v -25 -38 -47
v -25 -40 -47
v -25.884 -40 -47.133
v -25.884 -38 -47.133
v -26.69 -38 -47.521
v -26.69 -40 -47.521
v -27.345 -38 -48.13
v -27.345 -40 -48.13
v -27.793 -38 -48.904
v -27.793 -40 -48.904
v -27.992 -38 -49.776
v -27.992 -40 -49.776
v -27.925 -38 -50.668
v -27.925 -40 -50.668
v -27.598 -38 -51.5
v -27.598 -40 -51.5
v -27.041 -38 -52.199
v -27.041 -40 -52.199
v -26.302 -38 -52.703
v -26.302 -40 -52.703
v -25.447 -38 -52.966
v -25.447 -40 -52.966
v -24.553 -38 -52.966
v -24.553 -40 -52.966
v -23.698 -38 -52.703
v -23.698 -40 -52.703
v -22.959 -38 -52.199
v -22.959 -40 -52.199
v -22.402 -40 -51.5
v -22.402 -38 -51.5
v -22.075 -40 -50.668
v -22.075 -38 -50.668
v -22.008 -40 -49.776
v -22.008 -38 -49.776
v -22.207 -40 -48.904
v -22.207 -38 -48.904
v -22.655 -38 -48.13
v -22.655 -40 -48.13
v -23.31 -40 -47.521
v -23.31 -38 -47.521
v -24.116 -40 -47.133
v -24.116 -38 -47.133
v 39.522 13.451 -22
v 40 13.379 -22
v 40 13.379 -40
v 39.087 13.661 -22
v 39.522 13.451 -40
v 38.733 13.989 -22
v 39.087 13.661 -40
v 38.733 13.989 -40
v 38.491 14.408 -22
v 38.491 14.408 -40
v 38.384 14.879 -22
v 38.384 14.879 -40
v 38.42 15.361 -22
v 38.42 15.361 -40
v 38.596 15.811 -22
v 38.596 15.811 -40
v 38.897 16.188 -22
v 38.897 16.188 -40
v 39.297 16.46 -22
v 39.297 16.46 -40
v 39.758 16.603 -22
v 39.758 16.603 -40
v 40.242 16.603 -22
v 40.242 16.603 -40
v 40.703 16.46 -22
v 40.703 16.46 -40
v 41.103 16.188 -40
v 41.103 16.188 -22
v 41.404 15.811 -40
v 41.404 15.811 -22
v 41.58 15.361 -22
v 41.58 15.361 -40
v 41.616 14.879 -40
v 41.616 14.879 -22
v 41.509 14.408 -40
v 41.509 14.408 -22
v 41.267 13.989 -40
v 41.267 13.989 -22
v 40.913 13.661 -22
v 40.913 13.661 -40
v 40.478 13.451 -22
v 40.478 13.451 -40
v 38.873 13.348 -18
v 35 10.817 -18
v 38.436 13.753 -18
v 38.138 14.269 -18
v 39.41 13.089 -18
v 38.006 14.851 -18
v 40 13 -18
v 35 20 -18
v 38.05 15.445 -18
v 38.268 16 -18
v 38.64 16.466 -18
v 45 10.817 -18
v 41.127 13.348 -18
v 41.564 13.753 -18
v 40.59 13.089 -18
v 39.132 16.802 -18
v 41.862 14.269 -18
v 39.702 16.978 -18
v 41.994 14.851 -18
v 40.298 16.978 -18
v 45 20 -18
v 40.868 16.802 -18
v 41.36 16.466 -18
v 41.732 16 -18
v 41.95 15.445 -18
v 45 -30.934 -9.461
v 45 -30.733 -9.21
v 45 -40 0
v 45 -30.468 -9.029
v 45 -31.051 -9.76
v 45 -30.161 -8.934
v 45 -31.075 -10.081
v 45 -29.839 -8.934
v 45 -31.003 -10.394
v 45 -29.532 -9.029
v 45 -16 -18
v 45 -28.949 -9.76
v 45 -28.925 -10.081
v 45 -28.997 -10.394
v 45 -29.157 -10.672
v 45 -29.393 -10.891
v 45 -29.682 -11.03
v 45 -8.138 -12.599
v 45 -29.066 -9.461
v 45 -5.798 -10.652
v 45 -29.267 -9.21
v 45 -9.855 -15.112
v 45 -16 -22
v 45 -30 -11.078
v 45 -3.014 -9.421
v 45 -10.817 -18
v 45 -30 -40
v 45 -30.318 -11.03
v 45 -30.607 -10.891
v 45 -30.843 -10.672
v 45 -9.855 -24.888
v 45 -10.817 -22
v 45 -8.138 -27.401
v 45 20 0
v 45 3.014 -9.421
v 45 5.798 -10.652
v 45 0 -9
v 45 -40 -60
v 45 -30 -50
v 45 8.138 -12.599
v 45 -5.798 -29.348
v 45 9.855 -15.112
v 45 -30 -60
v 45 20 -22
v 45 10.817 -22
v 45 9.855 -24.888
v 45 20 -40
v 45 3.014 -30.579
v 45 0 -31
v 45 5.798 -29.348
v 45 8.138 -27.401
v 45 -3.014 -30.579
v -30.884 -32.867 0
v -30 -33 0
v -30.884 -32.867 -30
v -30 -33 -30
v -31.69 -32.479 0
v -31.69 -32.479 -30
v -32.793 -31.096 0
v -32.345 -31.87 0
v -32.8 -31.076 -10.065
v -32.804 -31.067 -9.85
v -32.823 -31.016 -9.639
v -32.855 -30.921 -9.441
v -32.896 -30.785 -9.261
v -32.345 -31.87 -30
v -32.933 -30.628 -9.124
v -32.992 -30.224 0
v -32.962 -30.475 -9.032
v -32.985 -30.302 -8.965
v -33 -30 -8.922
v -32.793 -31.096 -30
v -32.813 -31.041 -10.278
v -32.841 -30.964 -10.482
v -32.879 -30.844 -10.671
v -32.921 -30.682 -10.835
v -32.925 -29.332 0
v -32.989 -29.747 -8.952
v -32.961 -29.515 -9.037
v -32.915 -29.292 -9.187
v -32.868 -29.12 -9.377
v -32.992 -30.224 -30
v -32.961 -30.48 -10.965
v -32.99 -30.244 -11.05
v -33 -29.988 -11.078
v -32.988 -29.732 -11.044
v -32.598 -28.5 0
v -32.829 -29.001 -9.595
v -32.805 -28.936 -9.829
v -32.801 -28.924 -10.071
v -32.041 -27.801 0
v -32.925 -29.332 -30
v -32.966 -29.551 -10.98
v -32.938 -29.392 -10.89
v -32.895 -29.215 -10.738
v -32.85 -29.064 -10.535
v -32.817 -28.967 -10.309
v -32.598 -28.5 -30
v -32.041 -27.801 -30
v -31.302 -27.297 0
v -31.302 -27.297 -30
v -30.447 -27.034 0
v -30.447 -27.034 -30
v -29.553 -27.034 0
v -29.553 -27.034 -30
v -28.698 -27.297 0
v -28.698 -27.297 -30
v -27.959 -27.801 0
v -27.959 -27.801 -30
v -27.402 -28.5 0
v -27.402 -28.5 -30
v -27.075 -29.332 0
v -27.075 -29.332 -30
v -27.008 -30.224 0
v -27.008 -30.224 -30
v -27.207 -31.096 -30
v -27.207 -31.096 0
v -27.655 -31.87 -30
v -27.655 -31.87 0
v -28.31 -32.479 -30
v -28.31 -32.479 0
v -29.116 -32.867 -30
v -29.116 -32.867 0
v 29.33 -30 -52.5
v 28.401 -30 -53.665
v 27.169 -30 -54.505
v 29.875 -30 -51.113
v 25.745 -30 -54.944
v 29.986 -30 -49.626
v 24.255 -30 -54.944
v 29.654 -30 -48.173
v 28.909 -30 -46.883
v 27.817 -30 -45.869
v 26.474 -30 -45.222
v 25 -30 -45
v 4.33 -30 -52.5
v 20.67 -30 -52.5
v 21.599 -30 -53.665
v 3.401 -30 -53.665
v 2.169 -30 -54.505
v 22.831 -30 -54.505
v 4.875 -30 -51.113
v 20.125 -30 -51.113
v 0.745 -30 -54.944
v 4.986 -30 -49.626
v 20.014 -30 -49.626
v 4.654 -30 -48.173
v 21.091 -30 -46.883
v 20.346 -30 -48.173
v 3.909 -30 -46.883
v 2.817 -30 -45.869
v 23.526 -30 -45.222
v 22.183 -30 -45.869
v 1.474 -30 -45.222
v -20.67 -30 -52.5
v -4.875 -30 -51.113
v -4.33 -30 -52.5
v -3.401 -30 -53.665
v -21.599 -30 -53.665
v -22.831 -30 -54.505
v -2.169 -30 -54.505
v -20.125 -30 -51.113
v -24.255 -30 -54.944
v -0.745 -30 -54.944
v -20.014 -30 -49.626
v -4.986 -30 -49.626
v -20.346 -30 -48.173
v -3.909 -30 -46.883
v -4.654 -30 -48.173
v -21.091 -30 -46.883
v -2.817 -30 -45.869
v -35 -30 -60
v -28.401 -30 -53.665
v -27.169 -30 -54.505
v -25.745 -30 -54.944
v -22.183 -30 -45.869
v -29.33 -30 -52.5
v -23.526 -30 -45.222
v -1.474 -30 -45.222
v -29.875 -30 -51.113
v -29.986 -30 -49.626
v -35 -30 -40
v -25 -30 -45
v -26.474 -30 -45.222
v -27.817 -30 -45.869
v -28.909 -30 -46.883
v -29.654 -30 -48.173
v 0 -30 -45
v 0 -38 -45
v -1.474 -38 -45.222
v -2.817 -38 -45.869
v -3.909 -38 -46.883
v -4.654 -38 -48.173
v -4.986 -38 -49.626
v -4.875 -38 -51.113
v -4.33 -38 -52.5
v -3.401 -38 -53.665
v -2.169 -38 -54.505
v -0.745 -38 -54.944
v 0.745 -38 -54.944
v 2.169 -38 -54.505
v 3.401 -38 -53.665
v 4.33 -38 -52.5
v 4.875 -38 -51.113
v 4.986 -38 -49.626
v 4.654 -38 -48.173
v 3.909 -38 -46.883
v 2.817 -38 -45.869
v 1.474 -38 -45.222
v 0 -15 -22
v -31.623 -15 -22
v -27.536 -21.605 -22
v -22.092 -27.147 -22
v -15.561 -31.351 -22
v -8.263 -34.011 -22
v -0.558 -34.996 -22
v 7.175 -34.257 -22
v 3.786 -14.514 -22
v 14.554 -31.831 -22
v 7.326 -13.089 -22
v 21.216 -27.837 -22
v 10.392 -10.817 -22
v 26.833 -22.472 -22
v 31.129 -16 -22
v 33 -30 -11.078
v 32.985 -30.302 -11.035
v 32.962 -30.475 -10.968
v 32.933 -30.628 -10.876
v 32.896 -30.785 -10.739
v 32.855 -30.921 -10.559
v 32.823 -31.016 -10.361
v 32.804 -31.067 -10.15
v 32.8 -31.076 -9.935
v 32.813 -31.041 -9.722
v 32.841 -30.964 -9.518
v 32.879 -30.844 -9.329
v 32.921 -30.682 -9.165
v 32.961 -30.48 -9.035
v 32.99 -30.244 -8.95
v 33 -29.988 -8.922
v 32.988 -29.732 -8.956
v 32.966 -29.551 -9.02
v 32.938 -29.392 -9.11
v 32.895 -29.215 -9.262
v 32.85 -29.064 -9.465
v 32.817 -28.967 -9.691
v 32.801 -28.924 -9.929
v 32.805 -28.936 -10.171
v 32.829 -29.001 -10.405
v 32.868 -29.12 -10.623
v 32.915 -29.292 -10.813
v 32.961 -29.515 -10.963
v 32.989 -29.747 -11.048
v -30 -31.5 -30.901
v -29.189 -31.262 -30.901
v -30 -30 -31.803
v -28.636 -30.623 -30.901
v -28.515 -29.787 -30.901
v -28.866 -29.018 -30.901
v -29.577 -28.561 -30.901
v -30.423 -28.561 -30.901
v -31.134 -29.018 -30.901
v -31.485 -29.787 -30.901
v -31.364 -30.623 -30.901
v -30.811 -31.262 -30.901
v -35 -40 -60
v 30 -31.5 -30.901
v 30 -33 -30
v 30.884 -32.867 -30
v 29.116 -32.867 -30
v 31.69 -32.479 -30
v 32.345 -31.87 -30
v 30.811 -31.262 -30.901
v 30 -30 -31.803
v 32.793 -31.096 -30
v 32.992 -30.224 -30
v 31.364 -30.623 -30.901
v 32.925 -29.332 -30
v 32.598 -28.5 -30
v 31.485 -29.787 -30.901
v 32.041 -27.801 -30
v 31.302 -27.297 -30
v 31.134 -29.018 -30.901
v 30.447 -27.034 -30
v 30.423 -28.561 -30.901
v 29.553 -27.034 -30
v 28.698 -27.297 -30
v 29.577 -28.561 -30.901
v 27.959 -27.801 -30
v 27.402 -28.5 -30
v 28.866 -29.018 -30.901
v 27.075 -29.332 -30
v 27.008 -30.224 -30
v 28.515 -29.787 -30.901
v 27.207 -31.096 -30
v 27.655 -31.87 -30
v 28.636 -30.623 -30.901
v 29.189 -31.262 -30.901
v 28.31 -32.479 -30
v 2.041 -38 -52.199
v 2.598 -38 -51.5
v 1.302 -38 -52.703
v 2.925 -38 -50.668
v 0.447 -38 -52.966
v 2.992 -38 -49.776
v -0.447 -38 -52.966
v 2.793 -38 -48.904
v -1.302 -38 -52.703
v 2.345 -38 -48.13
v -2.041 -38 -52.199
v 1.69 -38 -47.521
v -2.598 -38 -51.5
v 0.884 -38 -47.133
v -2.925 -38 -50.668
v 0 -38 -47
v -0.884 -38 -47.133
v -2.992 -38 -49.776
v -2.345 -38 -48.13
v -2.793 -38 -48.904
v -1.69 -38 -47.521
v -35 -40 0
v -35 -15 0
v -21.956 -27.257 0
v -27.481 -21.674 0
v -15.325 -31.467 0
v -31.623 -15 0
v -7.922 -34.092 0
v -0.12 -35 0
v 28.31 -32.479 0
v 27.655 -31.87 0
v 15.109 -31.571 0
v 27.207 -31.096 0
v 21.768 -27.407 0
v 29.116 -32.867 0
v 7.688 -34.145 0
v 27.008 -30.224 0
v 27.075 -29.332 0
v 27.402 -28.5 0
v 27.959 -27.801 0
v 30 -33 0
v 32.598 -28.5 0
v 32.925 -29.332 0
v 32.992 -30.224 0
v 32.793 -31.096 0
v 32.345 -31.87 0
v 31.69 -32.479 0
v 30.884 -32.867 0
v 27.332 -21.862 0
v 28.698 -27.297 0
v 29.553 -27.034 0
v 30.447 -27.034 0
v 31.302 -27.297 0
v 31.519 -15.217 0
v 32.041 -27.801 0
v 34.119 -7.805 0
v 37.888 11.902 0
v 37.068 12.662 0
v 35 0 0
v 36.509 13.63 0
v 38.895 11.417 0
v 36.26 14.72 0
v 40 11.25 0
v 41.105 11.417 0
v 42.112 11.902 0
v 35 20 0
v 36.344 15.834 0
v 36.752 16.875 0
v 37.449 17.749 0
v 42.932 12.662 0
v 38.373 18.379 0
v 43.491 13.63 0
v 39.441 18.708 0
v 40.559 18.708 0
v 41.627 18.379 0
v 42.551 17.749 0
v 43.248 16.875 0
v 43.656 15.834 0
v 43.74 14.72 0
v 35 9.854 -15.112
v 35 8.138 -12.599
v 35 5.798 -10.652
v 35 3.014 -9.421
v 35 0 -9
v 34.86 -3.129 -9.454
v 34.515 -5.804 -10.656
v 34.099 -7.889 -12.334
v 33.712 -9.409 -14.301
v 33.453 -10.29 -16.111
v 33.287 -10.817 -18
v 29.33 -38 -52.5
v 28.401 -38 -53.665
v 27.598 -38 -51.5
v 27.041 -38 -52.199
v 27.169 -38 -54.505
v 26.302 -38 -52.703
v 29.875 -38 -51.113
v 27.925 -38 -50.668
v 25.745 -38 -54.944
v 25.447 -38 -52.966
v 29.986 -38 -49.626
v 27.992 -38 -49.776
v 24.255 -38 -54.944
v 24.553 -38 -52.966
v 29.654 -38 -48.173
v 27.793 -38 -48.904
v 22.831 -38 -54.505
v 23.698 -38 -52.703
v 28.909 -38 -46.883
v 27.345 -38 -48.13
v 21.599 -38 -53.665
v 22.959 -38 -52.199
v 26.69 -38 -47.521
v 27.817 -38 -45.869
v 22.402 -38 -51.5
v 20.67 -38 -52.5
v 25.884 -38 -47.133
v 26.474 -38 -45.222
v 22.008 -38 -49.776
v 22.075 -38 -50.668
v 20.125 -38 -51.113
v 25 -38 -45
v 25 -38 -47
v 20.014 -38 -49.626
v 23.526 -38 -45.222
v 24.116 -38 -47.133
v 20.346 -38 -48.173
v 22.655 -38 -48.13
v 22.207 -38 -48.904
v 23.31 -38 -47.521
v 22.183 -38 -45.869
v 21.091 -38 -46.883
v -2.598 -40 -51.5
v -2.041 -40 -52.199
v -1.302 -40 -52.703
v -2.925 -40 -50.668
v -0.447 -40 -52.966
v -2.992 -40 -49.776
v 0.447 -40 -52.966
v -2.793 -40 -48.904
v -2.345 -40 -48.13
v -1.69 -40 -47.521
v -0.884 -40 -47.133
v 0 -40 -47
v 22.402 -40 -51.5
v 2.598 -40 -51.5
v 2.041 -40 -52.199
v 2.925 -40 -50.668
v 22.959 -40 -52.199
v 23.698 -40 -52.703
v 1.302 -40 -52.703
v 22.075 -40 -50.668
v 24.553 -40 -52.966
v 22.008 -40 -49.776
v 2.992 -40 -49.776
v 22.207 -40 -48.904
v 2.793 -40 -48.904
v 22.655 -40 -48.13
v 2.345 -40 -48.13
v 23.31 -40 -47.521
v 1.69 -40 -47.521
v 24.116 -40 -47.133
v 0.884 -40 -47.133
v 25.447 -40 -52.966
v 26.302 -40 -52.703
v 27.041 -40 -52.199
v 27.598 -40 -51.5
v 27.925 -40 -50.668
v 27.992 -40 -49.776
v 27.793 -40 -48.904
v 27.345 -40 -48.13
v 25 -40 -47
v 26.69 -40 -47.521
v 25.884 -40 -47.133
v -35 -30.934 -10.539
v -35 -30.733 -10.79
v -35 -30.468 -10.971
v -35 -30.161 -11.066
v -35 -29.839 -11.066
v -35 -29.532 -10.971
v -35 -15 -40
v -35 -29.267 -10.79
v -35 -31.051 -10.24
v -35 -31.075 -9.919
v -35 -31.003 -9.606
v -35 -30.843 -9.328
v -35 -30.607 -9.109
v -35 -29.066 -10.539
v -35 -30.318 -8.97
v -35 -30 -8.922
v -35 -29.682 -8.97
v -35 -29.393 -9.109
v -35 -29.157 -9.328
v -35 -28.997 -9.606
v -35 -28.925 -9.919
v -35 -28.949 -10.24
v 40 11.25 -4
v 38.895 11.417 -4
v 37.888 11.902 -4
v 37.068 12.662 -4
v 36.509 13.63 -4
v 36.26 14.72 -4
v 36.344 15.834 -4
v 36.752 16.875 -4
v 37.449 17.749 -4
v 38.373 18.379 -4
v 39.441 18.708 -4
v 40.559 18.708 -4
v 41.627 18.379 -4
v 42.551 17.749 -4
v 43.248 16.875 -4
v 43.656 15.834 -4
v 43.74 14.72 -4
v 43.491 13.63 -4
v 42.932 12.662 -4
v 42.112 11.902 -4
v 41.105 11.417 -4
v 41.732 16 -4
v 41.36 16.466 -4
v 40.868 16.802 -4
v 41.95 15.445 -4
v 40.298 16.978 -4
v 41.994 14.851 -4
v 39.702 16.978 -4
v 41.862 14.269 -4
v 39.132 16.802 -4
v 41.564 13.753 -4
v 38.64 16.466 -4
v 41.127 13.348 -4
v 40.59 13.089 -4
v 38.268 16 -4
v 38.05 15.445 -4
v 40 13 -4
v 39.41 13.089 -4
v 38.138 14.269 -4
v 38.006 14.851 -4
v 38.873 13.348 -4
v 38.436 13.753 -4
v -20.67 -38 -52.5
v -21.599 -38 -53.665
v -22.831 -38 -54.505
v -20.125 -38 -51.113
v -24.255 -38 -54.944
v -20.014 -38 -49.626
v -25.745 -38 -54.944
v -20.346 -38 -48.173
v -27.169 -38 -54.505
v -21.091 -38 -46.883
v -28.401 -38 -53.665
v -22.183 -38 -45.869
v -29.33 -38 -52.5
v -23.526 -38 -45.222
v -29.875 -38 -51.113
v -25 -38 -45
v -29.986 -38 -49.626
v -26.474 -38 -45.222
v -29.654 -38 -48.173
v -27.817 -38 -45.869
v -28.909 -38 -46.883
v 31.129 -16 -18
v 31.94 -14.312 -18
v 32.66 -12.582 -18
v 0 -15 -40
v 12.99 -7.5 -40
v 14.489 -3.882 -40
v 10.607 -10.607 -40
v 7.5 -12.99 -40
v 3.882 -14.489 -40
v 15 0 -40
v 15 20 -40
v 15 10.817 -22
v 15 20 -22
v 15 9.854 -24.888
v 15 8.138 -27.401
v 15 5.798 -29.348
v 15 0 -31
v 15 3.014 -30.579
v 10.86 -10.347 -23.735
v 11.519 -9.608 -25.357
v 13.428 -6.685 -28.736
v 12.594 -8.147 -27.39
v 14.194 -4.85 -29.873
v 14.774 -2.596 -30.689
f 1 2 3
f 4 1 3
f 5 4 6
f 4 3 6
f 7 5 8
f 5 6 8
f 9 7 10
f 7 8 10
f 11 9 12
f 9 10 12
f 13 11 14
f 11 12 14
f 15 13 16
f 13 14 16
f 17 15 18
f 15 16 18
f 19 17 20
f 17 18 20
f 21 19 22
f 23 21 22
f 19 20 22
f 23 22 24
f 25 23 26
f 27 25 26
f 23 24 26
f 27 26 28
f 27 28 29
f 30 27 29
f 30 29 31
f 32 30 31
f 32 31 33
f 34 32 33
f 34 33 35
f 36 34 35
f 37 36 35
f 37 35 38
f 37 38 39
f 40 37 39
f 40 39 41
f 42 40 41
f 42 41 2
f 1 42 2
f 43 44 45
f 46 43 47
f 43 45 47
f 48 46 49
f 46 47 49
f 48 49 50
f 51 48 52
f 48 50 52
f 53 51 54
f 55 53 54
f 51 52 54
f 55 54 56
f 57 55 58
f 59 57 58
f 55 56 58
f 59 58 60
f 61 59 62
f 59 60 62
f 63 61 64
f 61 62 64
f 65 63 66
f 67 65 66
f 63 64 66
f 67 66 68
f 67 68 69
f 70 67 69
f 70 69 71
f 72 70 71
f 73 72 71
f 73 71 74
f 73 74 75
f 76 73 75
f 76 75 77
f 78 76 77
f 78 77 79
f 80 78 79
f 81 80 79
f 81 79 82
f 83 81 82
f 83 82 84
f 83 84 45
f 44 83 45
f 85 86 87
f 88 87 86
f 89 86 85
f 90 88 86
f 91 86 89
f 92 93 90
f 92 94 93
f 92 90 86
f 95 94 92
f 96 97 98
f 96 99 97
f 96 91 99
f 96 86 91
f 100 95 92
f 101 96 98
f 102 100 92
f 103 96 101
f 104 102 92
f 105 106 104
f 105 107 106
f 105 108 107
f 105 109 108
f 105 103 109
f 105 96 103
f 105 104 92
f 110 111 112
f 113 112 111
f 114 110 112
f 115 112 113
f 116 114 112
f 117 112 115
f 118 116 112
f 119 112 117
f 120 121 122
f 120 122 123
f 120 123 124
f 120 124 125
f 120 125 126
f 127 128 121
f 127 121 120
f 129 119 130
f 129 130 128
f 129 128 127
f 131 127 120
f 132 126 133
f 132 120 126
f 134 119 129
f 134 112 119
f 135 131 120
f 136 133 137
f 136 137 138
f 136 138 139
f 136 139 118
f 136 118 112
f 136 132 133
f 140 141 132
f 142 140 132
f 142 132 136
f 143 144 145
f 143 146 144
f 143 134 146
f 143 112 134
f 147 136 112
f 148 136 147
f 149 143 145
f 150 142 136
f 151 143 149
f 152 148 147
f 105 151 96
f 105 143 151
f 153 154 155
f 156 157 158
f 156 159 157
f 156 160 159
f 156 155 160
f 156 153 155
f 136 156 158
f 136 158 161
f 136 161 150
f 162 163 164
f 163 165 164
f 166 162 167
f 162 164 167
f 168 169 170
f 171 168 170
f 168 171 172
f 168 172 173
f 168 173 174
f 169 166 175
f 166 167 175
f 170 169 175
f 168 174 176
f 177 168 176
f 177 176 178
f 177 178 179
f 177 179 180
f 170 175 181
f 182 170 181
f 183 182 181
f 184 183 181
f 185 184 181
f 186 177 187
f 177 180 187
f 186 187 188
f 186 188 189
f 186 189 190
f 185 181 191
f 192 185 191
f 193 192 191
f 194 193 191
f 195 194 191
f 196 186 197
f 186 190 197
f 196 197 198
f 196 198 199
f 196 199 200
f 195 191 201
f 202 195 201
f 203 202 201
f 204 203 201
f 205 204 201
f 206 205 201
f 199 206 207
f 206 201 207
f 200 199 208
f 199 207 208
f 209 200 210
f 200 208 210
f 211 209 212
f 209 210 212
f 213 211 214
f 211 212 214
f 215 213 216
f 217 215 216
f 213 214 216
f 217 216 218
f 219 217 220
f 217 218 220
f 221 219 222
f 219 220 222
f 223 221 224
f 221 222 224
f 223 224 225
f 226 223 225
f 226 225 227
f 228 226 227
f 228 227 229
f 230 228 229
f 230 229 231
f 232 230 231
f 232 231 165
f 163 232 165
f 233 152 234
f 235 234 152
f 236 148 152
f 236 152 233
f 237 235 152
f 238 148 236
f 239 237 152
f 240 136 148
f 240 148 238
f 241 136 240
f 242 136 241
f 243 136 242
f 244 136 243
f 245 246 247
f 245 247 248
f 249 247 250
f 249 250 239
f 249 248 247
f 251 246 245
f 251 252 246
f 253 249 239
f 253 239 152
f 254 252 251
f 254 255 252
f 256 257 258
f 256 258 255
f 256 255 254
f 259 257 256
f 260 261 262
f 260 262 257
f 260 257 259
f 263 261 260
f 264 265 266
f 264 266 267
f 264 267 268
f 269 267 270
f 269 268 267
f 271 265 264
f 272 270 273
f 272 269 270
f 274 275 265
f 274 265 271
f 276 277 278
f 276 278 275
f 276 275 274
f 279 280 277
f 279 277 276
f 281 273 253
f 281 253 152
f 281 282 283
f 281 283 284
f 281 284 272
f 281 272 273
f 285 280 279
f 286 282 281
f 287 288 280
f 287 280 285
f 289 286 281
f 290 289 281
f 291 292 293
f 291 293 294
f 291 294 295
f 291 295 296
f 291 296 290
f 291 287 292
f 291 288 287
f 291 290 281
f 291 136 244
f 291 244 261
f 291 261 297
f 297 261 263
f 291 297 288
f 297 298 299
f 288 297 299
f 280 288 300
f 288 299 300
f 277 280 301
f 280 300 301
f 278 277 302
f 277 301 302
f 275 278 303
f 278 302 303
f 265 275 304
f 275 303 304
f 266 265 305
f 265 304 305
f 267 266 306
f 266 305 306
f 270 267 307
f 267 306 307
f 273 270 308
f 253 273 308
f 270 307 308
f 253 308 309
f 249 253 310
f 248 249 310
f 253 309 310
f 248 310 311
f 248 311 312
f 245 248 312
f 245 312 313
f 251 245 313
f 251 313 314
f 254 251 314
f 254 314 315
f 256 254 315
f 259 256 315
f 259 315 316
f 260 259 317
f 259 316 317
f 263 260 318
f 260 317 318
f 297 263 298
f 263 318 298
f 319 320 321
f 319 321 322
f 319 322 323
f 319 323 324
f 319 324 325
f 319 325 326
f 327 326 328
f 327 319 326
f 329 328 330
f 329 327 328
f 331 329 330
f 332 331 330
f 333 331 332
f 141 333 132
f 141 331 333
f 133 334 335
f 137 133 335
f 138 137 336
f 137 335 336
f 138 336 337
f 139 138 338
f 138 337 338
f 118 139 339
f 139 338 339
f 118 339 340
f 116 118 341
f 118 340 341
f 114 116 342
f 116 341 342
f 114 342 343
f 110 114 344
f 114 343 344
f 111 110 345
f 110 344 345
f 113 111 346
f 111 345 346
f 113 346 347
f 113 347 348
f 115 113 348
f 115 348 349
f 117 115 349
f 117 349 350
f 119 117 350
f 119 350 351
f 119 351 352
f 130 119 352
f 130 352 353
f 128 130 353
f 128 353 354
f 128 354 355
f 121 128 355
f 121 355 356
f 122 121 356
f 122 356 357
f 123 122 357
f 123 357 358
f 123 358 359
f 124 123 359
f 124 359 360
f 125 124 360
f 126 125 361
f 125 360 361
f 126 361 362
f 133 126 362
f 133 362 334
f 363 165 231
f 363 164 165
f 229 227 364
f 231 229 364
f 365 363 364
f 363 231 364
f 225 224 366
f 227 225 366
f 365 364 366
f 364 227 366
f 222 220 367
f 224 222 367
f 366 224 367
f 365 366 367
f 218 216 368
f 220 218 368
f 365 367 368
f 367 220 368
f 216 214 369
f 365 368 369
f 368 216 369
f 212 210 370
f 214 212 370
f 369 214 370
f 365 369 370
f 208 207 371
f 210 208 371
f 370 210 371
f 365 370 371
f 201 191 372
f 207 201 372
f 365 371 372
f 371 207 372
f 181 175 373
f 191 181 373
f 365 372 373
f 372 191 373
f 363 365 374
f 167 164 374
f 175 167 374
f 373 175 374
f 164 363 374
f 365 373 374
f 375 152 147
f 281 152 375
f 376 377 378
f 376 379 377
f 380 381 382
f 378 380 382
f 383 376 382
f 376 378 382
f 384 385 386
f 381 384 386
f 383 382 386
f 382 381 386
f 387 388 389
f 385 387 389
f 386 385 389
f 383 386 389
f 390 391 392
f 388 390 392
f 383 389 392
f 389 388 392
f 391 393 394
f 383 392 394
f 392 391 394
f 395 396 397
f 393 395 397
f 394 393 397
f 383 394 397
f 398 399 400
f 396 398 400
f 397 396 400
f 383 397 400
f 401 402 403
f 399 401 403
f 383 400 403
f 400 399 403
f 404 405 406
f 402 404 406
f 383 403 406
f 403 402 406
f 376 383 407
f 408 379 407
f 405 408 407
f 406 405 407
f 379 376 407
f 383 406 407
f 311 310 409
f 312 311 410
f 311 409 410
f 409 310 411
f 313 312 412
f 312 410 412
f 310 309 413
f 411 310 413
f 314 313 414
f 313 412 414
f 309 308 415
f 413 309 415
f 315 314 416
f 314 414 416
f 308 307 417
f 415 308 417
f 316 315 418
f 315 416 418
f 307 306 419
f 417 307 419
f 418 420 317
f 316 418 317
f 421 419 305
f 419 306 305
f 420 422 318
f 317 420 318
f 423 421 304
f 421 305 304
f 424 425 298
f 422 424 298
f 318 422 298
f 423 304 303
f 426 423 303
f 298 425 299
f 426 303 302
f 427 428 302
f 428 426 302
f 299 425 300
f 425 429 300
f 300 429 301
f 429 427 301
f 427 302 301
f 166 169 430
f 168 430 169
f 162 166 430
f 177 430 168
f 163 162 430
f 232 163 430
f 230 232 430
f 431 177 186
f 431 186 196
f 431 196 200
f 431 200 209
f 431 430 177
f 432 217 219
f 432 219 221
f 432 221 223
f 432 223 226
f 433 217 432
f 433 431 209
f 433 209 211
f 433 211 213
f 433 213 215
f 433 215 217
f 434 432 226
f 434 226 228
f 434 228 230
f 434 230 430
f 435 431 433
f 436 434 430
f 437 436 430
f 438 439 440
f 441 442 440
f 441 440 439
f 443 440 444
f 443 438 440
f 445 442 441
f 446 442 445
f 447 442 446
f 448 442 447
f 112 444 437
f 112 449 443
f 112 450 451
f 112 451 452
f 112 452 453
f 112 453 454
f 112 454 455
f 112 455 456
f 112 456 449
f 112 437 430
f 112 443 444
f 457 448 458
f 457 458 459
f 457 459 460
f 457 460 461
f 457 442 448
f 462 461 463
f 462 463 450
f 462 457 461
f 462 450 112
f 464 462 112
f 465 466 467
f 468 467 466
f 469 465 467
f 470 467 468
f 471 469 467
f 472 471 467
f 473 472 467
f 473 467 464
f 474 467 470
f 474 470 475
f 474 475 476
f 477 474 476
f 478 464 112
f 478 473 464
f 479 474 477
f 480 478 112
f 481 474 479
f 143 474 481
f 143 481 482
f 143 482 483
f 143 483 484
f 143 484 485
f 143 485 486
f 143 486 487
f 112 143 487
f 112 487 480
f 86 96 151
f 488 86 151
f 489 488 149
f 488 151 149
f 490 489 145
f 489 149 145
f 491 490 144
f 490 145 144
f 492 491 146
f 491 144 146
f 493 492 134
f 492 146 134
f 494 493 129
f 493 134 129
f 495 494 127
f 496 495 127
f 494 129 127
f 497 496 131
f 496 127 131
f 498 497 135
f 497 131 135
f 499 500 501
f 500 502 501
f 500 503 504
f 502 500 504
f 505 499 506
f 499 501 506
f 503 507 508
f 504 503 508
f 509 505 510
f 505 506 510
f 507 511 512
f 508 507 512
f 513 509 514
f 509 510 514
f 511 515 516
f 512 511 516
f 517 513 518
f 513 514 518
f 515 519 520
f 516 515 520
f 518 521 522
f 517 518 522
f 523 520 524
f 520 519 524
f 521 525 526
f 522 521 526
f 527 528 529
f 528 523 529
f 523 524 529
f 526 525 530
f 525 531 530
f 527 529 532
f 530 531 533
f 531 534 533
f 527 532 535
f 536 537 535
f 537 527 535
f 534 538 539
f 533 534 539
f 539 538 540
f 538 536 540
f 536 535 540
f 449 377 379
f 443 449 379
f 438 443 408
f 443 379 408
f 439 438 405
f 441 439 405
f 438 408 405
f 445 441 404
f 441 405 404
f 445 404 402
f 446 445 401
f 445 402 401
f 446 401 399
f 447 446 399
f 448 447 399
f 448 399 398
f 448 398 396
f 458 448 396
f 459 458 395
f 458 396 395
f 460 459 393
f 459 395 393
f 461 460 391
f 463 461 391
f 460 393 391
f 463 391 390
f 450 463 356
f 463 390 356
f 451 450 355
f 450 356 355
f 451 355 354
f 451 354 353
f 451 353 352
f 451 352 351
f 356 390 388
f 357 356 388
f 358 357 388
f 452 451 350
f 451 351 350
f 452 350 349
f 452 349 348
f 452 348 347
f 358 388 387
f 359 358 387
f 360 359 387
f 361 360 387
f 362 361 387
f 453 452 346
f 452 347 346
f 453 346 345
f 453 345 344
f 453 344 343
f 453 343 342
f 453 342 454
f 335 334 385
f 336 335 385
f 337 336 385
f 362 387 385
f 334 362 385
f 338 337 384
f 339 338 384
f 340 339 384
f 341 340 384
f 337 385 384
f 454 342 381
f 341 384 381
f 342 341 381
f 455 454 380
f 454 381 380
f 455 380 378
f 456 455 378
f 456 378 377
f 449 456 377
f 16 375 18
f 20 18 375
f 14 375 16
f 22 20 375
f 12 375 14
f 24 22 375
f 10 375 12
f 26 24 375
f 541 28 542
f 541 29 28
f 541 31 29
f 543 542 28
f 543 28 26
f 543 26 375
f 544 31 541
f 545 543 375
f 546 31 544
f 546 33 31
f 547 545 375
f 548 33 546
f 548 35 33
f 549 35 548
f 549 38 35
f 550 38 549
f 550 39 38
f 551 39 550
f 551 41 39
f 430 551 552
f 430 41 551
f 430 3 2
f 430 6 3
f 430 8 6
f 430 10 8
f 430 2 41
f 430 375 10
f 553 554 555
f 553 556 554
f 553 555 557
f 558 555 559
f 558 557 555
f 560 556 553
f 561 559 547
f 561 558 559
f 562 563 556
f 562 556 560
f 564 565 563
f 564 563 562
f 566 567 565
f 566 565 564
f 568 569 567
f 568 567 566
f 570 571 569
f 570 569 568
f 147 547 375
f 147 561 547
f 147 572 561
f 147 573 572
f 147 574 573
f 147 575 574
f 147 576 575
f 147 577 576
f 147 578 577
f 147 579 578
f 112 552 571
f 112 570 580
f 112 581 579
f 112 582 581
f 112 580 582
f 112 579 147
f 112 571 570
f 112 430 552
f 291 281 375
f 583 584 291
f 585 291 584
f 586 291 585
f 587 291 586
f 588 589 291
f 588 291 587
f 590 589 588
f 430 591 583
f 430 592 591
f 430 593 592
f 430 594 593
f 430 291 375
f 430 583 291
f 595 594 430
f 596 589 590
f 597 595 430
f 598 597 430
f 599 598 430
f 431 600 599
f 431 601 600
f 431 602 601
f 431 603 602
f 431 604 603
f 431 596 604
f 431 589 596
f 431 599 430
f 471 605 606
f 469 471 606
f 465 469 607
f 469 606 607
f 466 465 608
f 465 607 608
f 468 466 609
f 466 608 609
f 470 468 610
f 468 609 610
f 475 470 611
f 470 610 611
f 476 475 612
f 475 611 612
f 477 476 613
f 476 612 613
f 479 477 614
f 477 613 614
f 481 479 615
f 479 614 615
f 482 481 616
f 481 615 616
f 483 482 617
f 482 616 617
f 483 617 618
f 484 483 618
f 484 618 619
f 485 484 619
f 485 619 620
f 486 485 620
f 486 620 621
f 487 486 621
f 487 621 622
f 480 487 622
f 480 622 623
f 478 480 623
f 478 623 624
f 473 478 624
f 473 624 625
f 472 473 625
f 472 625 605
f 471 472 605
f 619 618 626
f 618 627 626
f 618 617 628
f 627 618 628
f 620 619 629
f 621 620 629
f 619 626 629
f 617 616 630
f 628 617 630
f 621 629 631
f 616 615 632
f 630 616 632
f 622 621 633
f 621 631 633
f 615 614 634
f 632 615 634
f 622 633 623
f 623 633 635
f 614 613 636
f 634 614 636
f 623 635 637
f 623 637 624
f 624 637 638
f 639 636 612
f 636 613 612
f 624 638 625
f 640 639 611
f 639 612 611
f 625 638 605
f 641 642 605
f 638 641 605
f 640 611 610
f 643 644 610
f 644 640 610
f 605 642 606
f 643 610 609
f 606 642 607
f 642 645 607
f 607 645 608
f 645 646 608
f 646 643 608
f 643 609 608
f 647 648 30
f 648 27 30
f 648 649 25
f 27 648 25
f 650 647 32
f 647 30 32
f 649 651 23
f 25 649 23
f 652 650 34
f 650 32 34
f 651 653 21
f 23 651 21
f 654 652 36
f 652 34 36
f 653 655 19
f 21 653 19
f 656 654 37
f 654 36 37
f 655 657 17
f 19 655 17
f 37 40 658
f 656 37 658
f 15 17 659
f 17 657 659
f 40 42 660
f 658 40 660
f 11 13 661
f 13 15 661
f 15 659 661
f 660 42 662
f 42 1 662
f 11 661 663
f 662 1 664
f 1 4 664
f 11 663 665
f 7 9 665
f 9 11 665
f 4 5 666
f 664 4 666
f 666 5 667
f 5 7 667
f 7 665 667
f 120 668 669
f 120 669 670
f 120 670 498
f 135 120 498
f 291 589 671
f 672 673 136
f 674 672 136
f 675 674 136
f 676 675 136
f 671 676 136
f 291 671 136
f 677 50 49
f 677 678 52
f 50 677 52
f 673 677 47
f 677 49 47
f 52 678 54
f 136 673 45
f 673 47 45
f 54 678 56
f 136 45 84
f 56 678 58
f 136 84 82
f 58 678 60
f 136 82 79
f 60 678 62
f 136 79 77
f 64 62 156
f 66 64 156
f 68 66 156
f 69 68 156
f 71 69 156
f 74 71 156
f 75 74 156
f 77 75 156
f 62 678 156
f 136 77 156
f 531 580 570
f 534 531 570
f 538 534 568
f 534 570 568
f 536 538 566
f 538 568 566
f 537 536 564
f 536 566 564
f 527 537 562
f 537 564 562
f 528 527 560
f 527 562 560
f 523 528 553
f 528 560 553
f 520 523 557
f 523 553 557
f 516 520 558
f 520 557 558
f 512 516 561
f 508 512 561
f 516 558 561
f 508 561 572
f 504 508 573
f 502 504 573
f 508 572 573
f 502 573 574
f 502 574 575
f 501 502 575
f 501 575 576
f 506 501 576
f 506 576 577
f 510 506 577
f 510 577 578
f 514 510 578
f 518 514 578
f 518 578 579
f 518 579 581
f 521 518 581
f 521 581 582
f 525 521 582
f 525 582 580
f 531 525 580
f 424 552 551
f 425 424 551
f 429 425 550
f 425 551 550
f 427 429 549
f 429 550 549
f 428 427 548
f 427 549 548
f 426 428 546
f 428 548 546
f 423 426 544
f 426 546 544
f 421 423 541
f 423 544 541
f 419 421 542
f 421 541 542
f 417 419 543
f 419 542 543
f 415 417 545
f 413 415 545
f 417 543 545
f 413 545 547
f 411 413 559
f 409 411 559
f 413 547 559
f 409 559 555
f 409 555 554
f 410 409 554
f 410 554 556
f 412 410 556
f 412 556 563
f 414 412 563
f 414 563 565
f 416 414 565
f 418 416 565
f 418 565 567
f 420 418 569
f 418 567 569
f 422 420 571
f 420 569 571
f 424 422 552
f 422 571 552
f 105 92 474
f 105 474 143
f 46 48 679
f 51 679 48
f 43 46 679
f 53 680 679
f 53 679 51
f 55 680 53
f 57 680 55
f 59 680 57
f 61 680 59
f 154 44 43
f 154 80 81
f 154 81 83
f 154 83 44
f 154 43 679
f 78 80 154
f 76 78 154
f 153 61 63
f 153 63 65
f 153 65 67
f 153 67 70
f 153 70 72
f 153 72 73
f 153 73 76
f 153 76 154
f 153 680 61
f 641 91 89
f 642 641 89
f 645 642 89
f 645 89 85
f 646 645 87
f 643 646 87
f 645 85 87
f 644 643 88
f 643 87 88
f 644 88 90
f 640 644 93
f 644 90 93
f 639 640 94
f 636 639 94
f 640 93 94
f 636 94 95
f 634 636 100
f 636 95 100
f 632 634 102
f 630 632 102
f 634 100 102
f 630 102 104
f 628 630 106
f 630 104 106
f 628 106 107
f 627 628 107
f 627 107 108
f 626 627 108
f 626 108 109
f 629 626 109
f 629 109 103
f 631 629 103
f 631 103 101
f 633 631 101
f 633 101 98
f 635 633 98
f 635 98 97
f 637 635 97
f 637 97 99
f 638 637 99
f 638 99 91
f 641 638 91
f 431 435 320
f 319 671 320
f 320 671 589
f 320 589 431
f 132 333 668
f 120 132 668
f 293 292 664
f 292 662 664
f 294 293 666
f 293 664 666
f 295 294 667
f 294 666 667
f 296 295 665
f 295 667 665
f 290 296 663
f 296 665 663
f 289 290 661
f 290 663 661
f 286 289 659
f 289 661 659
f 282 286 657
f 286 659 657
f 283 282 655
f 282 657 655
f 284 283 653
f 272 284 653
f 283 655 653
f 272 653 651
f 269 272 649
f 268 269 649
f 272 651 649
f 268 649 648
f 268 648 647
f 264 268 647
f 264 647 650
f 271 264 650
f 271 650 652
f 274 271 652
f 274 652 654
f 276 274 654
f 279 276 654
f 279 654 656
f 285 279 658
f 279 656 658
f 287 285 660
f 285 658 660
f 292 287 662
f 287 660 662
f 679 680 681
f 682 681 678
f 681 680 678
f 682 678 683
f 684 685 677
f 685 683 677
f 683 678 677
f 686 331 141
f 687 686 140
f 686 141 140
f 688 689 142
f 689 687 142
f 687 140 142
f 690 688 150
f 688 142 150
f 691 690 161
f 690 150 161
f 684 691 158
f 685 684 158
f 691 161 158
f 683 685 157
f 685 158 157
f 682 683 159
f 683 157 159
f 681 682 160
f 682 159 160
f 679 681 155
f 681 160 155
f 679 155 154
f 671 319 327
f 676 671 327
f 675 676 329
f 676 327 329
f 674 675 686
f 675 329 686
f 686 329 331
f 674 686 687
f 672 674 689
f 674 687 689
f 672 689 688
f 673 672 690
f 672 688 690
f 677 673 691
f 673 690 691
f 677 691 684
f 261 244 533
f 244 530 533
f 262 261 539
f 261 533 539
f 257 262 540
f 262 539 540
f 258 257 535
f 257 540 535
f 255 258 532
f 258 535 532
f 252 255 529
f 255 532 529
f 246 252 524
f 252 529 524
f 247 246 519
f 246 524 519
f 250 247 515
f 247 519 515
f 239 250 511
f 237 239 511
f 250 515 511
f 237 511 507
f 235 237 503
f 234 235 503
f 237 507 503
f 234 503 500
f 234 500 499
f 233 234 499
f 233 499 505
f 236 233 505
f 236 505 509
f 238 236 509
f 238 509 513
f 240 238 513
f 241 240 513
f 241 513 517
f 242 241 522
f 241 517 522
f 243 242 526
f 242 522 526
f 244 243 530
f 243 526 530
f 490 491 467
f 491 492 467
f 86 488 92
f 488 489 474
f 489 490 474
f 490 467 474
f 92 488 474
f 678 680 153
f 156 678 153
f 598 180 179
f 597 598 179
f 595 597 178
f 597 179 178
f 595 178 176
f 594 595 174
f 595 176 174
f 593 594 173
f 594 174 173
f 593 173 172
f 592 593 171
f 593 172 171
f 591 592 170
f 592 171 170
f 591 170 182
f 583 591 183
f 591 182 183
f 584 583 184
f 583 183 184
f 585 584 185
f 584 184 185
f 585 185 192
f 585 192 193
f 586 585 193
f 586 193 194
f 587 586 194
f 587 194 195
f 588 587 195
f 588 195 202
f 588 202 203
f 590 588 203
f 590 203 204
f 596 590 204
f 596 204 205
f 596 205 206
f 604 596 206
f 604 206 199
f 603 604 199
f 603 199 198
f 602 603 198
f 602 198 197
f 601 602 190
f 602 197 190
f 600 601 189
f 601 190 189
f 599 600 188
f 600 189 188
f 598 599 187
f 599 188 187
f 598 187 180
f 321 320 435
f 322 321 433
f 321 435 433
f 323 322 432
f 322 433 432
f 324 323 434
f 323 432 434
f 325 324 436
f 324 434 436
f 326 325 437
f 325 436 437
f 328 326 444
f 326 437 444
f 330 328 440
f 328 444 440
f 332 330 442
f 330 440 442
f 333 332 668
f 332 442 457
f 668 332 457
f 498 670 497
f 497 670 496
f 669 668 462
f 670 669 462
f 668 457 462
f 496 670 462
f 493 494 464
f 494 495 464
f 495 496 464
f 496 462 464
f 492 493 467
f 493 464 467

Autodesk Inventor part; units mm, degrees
ref_plane "YZ Plane" through (0, 0, 0) normal (1, 0, 0) x (0, 1, 0)
ref_plane "XZ Plane" through (0, 0, 0) normal (0, 1, 0) x (-1, 0, 0)
ref_plane "XY Plane" through (0, 0, 0) normal (0, 0, 1) x (1, 0, 0)
sketch "Sketch1" plane through (0, 0, 0) normal (0, 0, 1) x (1, 0, 0)
  line L0 (0, 32) -> (0, -52) construction
  line L1 (-59.4, 0) -> (76.4, 0) construction
  line L2 (-40, 20) -> (57, 20)
  line L3 (57, 20) -> (57, -40)
  line L4 (57, -40) -> (-40, -40)
  line L5 (-40, -40) -> (-40, 20)
  point P0 (0, 0)
  dimension "d0" = 20
  dimension "d1" = 40
  dimension "d2" = 40
  dimension "d3" = 57
extrude "Extrusion1" add sketch "Sketch1" against normal blind 40
sketch "Sketch2" plane through (0, 0, 0) normal (0, 0, 1) x (1, 0, 0)
  line L0 (-40, 20) -> (57, 20) construction
  line L1 (-40, -40) -> (-40, 20) construction
  line L2 (57, -40) -> (-40, -40) construction
  line L3 (57, 20) -> (57, -40) construction
  line L4 (0, 98) -> (0, -63) construction
  line L5 (-59.4, 0) -> (76.4, 0) construction
  line L6 (0, 40) -> (0, 0) construction
  line L7 (-40, 20) -> (57, 20) projected
  line L8 (-35, 40) -> (-35, 0)
  line L9 (35, 0) -> (35, 40)
  arc A0 (35, 40) -> (-35, 40) centre (0, 40) ccw
  arc A1 (-35, 0) -> (35, 0) centre (0, 0) ccw
  point P0 (0, 20)
  dimension "d6" = 70
extrude "Extrusion2" cut sketch "Sketch2" against normal blind 22
sketch "Sketch3" plane through (57, -40, 0) normal (1, 0, 0) x (0, 0, -1)
  line L0 (0, 60) -> (0, 0) construction
  line L1 (0, 0) -> (40, 0) construction
  line L2 (40, 60) -> (40, 0) construction
  line L3 (0, 60) -> (40, 60) construction
  line L4 (0, 40) -> (40, 40) construction
  line L5 (40, 0) -> (40, 60) construction
  line L6 (0, 60) -> (40, 60) construction
  line L7 (20, 60) -> (20, 0) construction
  circle A0 centre (20, 40) radius 11
  dimension "d9" = 22
extrude "Extrusion3" cut sketch "Sketch3" against normal blind 65
sketch "Sketch4" plane through (57, -40, 0) normal (1, 0, 0) x (0, 0, -1)
  circle A0 centre (20, 40) radius 11 construction
  line L0 (0, 60) -> (0, 0) construction
  line L1 (0, 0) -> (40, 0) construction
  line L2 (40, 60) -> (40, 0) construction
  line L3 (0, 60) -> (40, 60) construction
  line L4 (0, 60) -> (40, 60) construction
  line L5 (20, 60) -> (20, 0) construction
  line L6 (0, 0) -> (40, 0) construction
  line L7 (0, 40) -> (40, 40) construction
  line L8 (18, 60) -> (22, 60)
  line L9 (22, 60) -> (22, 24)
  line L10 (22, 24) -> (18, 24)
  line L11 (18, 24) -> (18, 60)
  dimension "d12" = 16
  dimension "d13" = 4
extrude "Extrusion4" cut sketch "Sketch4" against normal blind 70
sketch "Sketch6" plane through (0, 0, 0) normal (0, 0, 1) x (1, 0, 0)
  line L0 (0, 44) -> (0, -54) construction
  line L1 (-59.4, 0) -> (76.4, 0) construction
  line L2 (-30, 30) -> (30, 30) construction
  line L3 (30, 30) -> (30, -30) construction
  line L4 (30, -30) -> (-30, -30) construction
  line L5 (-30, -30) -> (-30, 30) construction
  point P0 (0, 0)
  dimension "d19" = 60
  dimension "d20" = 60
hole "Hole1" at (-30, -30, 0) at (30, -30, 0) direction (0, 0, -1) diameter 6 depth 30 tip angle 118
sketch "Sketch7" plane through (0, 0, -40) normal (0, 0, -1) x (-1, 0, 0)
  line L0 (40, 20) -> (-57, 20) construction
  line L1 (-57, 20) -> (-57, -40) construction
  line L2 (-57, -40) -> (40, -40) construction
  line L3 (40, -40) -> (40, 20) construction
  line L4 (0, -52) -> (0, 32) construction
  line L5 (-76.4, 0) -> (59.4, 0) construction
  line L6 (40, 20) -> (-15, 20)
  line L7 (-15, 20) -> (-15, -15)
  line L8 (-15, -15) -> (40, -15)
  line L9 (40, -15) -> (40, 20)
  point P0 (0, 0)
  dimension "d28" = 15
  dimension "d29" = 15
extrude "Extrusion6" cut sketch "Sketch7" against normal up to next
fillet "Fillet1" radius 15 1 edges at (15, -15, -31)
sketch "Sketch8" plane through (0, 0, -40) normal (0, 0, -1) x (-1, 0, 0)
  line L0 (40, -15) -> (0, -15) construction
  arc A0 (-15, 0) -> (0, -15) centre (0, 0) ccw construction
  line L1 (-15, 0) -> (-15, 20) construction
  line L2 (-15, 20) -> (-57, 20) construction
  line L3 (-57, 20) -> (-57, -40) construction
  line L4 (-57, -40) -> (40, -40) construction
  line L5 (40, -40) -> (40, -15) construction
  line L6 (-57, 20) -> (-57, -40) projected
  line L7 (40, -40) -> (-57, -40)
  line L8 (-57, -40) -> (-57, -30)
  line L9 (-57, -30) -> (40, -30)
  line L10 (40, -30) -> (40, -40)
  point P0 (0, 0)
  dimension "d33" = 10
extrude "Extrusion7" add sketch "Sketch8" along normal blind 20
sketch "Sketch13" plane through (-40, -30, -40) normal (0, 1, 0) x (1, 0, 0)
  line L0 (40, 32) -> (40, -52) construction
  line L1 (97, 0) -> (0, 0) construction
  line L2 (97, 0) -> (97, 20) construction
  line L3 (0, 20) -> (97, 20) construction
  line L4 (0, 0) -> (0, 20) construction
  line L5 (97, -40) -> (97, 20) construction
  line L6 (97, 10) -> (0, 10) construction
  point P0 (40, -40)
  point P1 (40, 10)
  point P2 (65, 10)
  point P3 (90, 10)
  point P4 (15, 10)
  dimension "d60" = 25
  dimension "d61" = 25
  dimension "d62" = 25
hole "Hole4" at (0, -30, -50) at (25, -30, -50) at (50, -30, -50) at (-25, -30, -50) direction (0, -1, 0) diameter 6 end through all counterbore diameter 10 counterbore depth 8
sketch "Sketch14" plane through (0, 0, 0) normal (0, 0, 1) x (1, 0, 0)
  line L0 (-31.6228, -15) -> (-40, -15) construction
  line L1 (-40, -40) -> (-40, -15) construction
  line L2 (57, -40) -> (-40, -40) construction
  line L3 (57, 20) -> (57, -40) construction
  line L4 (35, 20) -> (57, 20) construction
  line L5 (35, 20) -> (35, 0) construction
  arc A0 (-31.6228, -15) -> (35, 0) centre (0, 0) ccw construction
  circle A1 centre (30, -30) radius 3 construction
  circle A2 centre (-30, -30) radius 3 construction
  line L6 (57, 15) -> (35, 15) construction
  point P0 (40, 15)
  dimension "d70" = 5
  dimension "d106" = 5
hole "Hole5" at (40, 15, 0) direction (0, 0, -1) diameter 4 end up to surface counterbore diameter 7.5 counterbore depth 4
sketch "Sketch15" plane through (0, 0, -22) normal (0, 0, 1) x (1, 0, 0)
  circle A0 centre (40, 15) radius 2 construction
  point P0 (0, 0)
hole "Hole6" at (40, 15, -22) direction (0, 0, -1) diameter 3.242 end through all thread size "M4x0.7" class "6H" standard "ANSI Metric M Profile"
sketch "Sketch16" plane through (-40, -40, 0) normal (-1, 0, 0) x (0, 0, 1)
  line L0 (0, 25) -> (-40, 25) construction
  line L1 (-40, 10) -> (-40, 25) construction
  line L2 (-40, 10) -> (-60, 10) construction
  line L3 (-60, 0) -> (-60, 10) construction
  line L4 (0, 0) -> (-60, 0) construction
  line L5 (0, 0) -> (0, 25) construction
  line L6 (0, 13) -> (0, 7) construction
  line L7 (-30, 7) -> (-30, 13) construction
  line L8 (-30, 10) -> (0, 10) construction
  point P0 (0, 40)
  point P1 (-10, 10)
  dimension "d86" = 10
hole "Hole7" at (-40, -30, -10) direction (1, 0, 0) diameter 2.156 depth 8.865 tip angle 118 thread size "4-40 UNC" class "2B" standard "ANSI Unified Screw Threads"
sketch "Sketch18" plane through (-40, -40, 0) normal (-1, 0, 0) x (0, 0, 1)
  circle A0 centre (-10, 10) radius 1.078 projected
  line L0 (0, 25) -> (-40, 25) projected
  line L1 (-40, 10) -> (-40, 25) projected
  line L2 (-40, 10) -> (-60, 10) projected
  line L3 (-60, 0) -> (-60, 10) projected
  line L4 (0, 0) -> (-60, 0) projected
  line L5 (0, 0) -> (0, 25) projected
  point P0 (0, 40)
extrude "Extrusion10" cut sketch "Sketch18" against normal blind 5
sketch "Sketch19" plane through (57, -40, 0) normal (1, 0, 0) x (0, 0, -1)
  line L0 (18, 50.8167) -> (18, 60) projected
  line L1 (0, 60) -> (18, 60) projected
  line L2 (0, 60) -> (0, 0) projected
  line L3 (0, 0) -> (60, 0) projected
  line L4 (60, 10) -> (60, 0) projected
  line L5 (40, 10) -> (60, 10) projected
  line L6 (40, 60) -> (40, 10) projected
  line L7 (22, 60) -> (40, 60) projected
  line L8 (22, 60) -> (22, 50.8167) projected
  arc A0 (22, 29.1833) -> (22, 50.8167) centre (20, 40) ccw projected
  line L9 (22, 29.1833) -> (22, 24) projected
  line L10 (22, 24) -> (18, 24) projected
  line L11 (18, 24) -> (18, 29.1833) projected
  arc A1 (18, 50.8167) -> (18, 29.1833) centre (20, 40) ccw projected
  point P0 (0, 40)
extrude "Extrusion11" cut sketch "Sketch19" against normal blind 12
sketch "Sketch20" plane through (45, -40, 0) normal (1, 0, 0) x (0, 0, -1)
  line L0 (18, 60) -> (18, 50.8167) construction
  line L1 (0, 60) -> (18, 60) construction
  line L2 (0, 0) -> (0, 60) construction
  line L3 (60, 0) -> (0, 0) construction
  line L4 (60, 10) -> (60, 0) construction
  line L5 (40, 10) -> (60, 10) construction
  line L6 (40, 60) -> (40, 10) construction
  line L7 (22, 60) -> (40, 60) construction
  line L8 (22, 50.8167) -> (22, 60) construction
  arc A0 (22, 29.1833) -> (22, 50.8167) centre (20, 40) ccw construction
  line L9 (22, 24) -> (22, 29.1833) construction
  line L10 (18, 24) -> (22, 24) construction
  line L11 (18, 29.1833) -> (18, 24) construction
  arc A1 (18, 50.8167) -> (18, 29.1833) centre (20, 40) ccw construction
  line L12 (0, 7) -> (0, 13) construction
  line L13 (30, 13) -> (30, 7) construction
  circle A2 centre (10, 10) radius 1.078 construction
  point P0 (0, 40)
hole "Hole9" at (45, -30, -10) direction (-1, 0, 0) diameter 2.156 depth 15 tip angle 118 thread size "4-40 UNC" class "2B" standard "ANSI Unified Screw Threads"
properties part number "Galvomount-22mm-diameter-Thorlabs-Left"
